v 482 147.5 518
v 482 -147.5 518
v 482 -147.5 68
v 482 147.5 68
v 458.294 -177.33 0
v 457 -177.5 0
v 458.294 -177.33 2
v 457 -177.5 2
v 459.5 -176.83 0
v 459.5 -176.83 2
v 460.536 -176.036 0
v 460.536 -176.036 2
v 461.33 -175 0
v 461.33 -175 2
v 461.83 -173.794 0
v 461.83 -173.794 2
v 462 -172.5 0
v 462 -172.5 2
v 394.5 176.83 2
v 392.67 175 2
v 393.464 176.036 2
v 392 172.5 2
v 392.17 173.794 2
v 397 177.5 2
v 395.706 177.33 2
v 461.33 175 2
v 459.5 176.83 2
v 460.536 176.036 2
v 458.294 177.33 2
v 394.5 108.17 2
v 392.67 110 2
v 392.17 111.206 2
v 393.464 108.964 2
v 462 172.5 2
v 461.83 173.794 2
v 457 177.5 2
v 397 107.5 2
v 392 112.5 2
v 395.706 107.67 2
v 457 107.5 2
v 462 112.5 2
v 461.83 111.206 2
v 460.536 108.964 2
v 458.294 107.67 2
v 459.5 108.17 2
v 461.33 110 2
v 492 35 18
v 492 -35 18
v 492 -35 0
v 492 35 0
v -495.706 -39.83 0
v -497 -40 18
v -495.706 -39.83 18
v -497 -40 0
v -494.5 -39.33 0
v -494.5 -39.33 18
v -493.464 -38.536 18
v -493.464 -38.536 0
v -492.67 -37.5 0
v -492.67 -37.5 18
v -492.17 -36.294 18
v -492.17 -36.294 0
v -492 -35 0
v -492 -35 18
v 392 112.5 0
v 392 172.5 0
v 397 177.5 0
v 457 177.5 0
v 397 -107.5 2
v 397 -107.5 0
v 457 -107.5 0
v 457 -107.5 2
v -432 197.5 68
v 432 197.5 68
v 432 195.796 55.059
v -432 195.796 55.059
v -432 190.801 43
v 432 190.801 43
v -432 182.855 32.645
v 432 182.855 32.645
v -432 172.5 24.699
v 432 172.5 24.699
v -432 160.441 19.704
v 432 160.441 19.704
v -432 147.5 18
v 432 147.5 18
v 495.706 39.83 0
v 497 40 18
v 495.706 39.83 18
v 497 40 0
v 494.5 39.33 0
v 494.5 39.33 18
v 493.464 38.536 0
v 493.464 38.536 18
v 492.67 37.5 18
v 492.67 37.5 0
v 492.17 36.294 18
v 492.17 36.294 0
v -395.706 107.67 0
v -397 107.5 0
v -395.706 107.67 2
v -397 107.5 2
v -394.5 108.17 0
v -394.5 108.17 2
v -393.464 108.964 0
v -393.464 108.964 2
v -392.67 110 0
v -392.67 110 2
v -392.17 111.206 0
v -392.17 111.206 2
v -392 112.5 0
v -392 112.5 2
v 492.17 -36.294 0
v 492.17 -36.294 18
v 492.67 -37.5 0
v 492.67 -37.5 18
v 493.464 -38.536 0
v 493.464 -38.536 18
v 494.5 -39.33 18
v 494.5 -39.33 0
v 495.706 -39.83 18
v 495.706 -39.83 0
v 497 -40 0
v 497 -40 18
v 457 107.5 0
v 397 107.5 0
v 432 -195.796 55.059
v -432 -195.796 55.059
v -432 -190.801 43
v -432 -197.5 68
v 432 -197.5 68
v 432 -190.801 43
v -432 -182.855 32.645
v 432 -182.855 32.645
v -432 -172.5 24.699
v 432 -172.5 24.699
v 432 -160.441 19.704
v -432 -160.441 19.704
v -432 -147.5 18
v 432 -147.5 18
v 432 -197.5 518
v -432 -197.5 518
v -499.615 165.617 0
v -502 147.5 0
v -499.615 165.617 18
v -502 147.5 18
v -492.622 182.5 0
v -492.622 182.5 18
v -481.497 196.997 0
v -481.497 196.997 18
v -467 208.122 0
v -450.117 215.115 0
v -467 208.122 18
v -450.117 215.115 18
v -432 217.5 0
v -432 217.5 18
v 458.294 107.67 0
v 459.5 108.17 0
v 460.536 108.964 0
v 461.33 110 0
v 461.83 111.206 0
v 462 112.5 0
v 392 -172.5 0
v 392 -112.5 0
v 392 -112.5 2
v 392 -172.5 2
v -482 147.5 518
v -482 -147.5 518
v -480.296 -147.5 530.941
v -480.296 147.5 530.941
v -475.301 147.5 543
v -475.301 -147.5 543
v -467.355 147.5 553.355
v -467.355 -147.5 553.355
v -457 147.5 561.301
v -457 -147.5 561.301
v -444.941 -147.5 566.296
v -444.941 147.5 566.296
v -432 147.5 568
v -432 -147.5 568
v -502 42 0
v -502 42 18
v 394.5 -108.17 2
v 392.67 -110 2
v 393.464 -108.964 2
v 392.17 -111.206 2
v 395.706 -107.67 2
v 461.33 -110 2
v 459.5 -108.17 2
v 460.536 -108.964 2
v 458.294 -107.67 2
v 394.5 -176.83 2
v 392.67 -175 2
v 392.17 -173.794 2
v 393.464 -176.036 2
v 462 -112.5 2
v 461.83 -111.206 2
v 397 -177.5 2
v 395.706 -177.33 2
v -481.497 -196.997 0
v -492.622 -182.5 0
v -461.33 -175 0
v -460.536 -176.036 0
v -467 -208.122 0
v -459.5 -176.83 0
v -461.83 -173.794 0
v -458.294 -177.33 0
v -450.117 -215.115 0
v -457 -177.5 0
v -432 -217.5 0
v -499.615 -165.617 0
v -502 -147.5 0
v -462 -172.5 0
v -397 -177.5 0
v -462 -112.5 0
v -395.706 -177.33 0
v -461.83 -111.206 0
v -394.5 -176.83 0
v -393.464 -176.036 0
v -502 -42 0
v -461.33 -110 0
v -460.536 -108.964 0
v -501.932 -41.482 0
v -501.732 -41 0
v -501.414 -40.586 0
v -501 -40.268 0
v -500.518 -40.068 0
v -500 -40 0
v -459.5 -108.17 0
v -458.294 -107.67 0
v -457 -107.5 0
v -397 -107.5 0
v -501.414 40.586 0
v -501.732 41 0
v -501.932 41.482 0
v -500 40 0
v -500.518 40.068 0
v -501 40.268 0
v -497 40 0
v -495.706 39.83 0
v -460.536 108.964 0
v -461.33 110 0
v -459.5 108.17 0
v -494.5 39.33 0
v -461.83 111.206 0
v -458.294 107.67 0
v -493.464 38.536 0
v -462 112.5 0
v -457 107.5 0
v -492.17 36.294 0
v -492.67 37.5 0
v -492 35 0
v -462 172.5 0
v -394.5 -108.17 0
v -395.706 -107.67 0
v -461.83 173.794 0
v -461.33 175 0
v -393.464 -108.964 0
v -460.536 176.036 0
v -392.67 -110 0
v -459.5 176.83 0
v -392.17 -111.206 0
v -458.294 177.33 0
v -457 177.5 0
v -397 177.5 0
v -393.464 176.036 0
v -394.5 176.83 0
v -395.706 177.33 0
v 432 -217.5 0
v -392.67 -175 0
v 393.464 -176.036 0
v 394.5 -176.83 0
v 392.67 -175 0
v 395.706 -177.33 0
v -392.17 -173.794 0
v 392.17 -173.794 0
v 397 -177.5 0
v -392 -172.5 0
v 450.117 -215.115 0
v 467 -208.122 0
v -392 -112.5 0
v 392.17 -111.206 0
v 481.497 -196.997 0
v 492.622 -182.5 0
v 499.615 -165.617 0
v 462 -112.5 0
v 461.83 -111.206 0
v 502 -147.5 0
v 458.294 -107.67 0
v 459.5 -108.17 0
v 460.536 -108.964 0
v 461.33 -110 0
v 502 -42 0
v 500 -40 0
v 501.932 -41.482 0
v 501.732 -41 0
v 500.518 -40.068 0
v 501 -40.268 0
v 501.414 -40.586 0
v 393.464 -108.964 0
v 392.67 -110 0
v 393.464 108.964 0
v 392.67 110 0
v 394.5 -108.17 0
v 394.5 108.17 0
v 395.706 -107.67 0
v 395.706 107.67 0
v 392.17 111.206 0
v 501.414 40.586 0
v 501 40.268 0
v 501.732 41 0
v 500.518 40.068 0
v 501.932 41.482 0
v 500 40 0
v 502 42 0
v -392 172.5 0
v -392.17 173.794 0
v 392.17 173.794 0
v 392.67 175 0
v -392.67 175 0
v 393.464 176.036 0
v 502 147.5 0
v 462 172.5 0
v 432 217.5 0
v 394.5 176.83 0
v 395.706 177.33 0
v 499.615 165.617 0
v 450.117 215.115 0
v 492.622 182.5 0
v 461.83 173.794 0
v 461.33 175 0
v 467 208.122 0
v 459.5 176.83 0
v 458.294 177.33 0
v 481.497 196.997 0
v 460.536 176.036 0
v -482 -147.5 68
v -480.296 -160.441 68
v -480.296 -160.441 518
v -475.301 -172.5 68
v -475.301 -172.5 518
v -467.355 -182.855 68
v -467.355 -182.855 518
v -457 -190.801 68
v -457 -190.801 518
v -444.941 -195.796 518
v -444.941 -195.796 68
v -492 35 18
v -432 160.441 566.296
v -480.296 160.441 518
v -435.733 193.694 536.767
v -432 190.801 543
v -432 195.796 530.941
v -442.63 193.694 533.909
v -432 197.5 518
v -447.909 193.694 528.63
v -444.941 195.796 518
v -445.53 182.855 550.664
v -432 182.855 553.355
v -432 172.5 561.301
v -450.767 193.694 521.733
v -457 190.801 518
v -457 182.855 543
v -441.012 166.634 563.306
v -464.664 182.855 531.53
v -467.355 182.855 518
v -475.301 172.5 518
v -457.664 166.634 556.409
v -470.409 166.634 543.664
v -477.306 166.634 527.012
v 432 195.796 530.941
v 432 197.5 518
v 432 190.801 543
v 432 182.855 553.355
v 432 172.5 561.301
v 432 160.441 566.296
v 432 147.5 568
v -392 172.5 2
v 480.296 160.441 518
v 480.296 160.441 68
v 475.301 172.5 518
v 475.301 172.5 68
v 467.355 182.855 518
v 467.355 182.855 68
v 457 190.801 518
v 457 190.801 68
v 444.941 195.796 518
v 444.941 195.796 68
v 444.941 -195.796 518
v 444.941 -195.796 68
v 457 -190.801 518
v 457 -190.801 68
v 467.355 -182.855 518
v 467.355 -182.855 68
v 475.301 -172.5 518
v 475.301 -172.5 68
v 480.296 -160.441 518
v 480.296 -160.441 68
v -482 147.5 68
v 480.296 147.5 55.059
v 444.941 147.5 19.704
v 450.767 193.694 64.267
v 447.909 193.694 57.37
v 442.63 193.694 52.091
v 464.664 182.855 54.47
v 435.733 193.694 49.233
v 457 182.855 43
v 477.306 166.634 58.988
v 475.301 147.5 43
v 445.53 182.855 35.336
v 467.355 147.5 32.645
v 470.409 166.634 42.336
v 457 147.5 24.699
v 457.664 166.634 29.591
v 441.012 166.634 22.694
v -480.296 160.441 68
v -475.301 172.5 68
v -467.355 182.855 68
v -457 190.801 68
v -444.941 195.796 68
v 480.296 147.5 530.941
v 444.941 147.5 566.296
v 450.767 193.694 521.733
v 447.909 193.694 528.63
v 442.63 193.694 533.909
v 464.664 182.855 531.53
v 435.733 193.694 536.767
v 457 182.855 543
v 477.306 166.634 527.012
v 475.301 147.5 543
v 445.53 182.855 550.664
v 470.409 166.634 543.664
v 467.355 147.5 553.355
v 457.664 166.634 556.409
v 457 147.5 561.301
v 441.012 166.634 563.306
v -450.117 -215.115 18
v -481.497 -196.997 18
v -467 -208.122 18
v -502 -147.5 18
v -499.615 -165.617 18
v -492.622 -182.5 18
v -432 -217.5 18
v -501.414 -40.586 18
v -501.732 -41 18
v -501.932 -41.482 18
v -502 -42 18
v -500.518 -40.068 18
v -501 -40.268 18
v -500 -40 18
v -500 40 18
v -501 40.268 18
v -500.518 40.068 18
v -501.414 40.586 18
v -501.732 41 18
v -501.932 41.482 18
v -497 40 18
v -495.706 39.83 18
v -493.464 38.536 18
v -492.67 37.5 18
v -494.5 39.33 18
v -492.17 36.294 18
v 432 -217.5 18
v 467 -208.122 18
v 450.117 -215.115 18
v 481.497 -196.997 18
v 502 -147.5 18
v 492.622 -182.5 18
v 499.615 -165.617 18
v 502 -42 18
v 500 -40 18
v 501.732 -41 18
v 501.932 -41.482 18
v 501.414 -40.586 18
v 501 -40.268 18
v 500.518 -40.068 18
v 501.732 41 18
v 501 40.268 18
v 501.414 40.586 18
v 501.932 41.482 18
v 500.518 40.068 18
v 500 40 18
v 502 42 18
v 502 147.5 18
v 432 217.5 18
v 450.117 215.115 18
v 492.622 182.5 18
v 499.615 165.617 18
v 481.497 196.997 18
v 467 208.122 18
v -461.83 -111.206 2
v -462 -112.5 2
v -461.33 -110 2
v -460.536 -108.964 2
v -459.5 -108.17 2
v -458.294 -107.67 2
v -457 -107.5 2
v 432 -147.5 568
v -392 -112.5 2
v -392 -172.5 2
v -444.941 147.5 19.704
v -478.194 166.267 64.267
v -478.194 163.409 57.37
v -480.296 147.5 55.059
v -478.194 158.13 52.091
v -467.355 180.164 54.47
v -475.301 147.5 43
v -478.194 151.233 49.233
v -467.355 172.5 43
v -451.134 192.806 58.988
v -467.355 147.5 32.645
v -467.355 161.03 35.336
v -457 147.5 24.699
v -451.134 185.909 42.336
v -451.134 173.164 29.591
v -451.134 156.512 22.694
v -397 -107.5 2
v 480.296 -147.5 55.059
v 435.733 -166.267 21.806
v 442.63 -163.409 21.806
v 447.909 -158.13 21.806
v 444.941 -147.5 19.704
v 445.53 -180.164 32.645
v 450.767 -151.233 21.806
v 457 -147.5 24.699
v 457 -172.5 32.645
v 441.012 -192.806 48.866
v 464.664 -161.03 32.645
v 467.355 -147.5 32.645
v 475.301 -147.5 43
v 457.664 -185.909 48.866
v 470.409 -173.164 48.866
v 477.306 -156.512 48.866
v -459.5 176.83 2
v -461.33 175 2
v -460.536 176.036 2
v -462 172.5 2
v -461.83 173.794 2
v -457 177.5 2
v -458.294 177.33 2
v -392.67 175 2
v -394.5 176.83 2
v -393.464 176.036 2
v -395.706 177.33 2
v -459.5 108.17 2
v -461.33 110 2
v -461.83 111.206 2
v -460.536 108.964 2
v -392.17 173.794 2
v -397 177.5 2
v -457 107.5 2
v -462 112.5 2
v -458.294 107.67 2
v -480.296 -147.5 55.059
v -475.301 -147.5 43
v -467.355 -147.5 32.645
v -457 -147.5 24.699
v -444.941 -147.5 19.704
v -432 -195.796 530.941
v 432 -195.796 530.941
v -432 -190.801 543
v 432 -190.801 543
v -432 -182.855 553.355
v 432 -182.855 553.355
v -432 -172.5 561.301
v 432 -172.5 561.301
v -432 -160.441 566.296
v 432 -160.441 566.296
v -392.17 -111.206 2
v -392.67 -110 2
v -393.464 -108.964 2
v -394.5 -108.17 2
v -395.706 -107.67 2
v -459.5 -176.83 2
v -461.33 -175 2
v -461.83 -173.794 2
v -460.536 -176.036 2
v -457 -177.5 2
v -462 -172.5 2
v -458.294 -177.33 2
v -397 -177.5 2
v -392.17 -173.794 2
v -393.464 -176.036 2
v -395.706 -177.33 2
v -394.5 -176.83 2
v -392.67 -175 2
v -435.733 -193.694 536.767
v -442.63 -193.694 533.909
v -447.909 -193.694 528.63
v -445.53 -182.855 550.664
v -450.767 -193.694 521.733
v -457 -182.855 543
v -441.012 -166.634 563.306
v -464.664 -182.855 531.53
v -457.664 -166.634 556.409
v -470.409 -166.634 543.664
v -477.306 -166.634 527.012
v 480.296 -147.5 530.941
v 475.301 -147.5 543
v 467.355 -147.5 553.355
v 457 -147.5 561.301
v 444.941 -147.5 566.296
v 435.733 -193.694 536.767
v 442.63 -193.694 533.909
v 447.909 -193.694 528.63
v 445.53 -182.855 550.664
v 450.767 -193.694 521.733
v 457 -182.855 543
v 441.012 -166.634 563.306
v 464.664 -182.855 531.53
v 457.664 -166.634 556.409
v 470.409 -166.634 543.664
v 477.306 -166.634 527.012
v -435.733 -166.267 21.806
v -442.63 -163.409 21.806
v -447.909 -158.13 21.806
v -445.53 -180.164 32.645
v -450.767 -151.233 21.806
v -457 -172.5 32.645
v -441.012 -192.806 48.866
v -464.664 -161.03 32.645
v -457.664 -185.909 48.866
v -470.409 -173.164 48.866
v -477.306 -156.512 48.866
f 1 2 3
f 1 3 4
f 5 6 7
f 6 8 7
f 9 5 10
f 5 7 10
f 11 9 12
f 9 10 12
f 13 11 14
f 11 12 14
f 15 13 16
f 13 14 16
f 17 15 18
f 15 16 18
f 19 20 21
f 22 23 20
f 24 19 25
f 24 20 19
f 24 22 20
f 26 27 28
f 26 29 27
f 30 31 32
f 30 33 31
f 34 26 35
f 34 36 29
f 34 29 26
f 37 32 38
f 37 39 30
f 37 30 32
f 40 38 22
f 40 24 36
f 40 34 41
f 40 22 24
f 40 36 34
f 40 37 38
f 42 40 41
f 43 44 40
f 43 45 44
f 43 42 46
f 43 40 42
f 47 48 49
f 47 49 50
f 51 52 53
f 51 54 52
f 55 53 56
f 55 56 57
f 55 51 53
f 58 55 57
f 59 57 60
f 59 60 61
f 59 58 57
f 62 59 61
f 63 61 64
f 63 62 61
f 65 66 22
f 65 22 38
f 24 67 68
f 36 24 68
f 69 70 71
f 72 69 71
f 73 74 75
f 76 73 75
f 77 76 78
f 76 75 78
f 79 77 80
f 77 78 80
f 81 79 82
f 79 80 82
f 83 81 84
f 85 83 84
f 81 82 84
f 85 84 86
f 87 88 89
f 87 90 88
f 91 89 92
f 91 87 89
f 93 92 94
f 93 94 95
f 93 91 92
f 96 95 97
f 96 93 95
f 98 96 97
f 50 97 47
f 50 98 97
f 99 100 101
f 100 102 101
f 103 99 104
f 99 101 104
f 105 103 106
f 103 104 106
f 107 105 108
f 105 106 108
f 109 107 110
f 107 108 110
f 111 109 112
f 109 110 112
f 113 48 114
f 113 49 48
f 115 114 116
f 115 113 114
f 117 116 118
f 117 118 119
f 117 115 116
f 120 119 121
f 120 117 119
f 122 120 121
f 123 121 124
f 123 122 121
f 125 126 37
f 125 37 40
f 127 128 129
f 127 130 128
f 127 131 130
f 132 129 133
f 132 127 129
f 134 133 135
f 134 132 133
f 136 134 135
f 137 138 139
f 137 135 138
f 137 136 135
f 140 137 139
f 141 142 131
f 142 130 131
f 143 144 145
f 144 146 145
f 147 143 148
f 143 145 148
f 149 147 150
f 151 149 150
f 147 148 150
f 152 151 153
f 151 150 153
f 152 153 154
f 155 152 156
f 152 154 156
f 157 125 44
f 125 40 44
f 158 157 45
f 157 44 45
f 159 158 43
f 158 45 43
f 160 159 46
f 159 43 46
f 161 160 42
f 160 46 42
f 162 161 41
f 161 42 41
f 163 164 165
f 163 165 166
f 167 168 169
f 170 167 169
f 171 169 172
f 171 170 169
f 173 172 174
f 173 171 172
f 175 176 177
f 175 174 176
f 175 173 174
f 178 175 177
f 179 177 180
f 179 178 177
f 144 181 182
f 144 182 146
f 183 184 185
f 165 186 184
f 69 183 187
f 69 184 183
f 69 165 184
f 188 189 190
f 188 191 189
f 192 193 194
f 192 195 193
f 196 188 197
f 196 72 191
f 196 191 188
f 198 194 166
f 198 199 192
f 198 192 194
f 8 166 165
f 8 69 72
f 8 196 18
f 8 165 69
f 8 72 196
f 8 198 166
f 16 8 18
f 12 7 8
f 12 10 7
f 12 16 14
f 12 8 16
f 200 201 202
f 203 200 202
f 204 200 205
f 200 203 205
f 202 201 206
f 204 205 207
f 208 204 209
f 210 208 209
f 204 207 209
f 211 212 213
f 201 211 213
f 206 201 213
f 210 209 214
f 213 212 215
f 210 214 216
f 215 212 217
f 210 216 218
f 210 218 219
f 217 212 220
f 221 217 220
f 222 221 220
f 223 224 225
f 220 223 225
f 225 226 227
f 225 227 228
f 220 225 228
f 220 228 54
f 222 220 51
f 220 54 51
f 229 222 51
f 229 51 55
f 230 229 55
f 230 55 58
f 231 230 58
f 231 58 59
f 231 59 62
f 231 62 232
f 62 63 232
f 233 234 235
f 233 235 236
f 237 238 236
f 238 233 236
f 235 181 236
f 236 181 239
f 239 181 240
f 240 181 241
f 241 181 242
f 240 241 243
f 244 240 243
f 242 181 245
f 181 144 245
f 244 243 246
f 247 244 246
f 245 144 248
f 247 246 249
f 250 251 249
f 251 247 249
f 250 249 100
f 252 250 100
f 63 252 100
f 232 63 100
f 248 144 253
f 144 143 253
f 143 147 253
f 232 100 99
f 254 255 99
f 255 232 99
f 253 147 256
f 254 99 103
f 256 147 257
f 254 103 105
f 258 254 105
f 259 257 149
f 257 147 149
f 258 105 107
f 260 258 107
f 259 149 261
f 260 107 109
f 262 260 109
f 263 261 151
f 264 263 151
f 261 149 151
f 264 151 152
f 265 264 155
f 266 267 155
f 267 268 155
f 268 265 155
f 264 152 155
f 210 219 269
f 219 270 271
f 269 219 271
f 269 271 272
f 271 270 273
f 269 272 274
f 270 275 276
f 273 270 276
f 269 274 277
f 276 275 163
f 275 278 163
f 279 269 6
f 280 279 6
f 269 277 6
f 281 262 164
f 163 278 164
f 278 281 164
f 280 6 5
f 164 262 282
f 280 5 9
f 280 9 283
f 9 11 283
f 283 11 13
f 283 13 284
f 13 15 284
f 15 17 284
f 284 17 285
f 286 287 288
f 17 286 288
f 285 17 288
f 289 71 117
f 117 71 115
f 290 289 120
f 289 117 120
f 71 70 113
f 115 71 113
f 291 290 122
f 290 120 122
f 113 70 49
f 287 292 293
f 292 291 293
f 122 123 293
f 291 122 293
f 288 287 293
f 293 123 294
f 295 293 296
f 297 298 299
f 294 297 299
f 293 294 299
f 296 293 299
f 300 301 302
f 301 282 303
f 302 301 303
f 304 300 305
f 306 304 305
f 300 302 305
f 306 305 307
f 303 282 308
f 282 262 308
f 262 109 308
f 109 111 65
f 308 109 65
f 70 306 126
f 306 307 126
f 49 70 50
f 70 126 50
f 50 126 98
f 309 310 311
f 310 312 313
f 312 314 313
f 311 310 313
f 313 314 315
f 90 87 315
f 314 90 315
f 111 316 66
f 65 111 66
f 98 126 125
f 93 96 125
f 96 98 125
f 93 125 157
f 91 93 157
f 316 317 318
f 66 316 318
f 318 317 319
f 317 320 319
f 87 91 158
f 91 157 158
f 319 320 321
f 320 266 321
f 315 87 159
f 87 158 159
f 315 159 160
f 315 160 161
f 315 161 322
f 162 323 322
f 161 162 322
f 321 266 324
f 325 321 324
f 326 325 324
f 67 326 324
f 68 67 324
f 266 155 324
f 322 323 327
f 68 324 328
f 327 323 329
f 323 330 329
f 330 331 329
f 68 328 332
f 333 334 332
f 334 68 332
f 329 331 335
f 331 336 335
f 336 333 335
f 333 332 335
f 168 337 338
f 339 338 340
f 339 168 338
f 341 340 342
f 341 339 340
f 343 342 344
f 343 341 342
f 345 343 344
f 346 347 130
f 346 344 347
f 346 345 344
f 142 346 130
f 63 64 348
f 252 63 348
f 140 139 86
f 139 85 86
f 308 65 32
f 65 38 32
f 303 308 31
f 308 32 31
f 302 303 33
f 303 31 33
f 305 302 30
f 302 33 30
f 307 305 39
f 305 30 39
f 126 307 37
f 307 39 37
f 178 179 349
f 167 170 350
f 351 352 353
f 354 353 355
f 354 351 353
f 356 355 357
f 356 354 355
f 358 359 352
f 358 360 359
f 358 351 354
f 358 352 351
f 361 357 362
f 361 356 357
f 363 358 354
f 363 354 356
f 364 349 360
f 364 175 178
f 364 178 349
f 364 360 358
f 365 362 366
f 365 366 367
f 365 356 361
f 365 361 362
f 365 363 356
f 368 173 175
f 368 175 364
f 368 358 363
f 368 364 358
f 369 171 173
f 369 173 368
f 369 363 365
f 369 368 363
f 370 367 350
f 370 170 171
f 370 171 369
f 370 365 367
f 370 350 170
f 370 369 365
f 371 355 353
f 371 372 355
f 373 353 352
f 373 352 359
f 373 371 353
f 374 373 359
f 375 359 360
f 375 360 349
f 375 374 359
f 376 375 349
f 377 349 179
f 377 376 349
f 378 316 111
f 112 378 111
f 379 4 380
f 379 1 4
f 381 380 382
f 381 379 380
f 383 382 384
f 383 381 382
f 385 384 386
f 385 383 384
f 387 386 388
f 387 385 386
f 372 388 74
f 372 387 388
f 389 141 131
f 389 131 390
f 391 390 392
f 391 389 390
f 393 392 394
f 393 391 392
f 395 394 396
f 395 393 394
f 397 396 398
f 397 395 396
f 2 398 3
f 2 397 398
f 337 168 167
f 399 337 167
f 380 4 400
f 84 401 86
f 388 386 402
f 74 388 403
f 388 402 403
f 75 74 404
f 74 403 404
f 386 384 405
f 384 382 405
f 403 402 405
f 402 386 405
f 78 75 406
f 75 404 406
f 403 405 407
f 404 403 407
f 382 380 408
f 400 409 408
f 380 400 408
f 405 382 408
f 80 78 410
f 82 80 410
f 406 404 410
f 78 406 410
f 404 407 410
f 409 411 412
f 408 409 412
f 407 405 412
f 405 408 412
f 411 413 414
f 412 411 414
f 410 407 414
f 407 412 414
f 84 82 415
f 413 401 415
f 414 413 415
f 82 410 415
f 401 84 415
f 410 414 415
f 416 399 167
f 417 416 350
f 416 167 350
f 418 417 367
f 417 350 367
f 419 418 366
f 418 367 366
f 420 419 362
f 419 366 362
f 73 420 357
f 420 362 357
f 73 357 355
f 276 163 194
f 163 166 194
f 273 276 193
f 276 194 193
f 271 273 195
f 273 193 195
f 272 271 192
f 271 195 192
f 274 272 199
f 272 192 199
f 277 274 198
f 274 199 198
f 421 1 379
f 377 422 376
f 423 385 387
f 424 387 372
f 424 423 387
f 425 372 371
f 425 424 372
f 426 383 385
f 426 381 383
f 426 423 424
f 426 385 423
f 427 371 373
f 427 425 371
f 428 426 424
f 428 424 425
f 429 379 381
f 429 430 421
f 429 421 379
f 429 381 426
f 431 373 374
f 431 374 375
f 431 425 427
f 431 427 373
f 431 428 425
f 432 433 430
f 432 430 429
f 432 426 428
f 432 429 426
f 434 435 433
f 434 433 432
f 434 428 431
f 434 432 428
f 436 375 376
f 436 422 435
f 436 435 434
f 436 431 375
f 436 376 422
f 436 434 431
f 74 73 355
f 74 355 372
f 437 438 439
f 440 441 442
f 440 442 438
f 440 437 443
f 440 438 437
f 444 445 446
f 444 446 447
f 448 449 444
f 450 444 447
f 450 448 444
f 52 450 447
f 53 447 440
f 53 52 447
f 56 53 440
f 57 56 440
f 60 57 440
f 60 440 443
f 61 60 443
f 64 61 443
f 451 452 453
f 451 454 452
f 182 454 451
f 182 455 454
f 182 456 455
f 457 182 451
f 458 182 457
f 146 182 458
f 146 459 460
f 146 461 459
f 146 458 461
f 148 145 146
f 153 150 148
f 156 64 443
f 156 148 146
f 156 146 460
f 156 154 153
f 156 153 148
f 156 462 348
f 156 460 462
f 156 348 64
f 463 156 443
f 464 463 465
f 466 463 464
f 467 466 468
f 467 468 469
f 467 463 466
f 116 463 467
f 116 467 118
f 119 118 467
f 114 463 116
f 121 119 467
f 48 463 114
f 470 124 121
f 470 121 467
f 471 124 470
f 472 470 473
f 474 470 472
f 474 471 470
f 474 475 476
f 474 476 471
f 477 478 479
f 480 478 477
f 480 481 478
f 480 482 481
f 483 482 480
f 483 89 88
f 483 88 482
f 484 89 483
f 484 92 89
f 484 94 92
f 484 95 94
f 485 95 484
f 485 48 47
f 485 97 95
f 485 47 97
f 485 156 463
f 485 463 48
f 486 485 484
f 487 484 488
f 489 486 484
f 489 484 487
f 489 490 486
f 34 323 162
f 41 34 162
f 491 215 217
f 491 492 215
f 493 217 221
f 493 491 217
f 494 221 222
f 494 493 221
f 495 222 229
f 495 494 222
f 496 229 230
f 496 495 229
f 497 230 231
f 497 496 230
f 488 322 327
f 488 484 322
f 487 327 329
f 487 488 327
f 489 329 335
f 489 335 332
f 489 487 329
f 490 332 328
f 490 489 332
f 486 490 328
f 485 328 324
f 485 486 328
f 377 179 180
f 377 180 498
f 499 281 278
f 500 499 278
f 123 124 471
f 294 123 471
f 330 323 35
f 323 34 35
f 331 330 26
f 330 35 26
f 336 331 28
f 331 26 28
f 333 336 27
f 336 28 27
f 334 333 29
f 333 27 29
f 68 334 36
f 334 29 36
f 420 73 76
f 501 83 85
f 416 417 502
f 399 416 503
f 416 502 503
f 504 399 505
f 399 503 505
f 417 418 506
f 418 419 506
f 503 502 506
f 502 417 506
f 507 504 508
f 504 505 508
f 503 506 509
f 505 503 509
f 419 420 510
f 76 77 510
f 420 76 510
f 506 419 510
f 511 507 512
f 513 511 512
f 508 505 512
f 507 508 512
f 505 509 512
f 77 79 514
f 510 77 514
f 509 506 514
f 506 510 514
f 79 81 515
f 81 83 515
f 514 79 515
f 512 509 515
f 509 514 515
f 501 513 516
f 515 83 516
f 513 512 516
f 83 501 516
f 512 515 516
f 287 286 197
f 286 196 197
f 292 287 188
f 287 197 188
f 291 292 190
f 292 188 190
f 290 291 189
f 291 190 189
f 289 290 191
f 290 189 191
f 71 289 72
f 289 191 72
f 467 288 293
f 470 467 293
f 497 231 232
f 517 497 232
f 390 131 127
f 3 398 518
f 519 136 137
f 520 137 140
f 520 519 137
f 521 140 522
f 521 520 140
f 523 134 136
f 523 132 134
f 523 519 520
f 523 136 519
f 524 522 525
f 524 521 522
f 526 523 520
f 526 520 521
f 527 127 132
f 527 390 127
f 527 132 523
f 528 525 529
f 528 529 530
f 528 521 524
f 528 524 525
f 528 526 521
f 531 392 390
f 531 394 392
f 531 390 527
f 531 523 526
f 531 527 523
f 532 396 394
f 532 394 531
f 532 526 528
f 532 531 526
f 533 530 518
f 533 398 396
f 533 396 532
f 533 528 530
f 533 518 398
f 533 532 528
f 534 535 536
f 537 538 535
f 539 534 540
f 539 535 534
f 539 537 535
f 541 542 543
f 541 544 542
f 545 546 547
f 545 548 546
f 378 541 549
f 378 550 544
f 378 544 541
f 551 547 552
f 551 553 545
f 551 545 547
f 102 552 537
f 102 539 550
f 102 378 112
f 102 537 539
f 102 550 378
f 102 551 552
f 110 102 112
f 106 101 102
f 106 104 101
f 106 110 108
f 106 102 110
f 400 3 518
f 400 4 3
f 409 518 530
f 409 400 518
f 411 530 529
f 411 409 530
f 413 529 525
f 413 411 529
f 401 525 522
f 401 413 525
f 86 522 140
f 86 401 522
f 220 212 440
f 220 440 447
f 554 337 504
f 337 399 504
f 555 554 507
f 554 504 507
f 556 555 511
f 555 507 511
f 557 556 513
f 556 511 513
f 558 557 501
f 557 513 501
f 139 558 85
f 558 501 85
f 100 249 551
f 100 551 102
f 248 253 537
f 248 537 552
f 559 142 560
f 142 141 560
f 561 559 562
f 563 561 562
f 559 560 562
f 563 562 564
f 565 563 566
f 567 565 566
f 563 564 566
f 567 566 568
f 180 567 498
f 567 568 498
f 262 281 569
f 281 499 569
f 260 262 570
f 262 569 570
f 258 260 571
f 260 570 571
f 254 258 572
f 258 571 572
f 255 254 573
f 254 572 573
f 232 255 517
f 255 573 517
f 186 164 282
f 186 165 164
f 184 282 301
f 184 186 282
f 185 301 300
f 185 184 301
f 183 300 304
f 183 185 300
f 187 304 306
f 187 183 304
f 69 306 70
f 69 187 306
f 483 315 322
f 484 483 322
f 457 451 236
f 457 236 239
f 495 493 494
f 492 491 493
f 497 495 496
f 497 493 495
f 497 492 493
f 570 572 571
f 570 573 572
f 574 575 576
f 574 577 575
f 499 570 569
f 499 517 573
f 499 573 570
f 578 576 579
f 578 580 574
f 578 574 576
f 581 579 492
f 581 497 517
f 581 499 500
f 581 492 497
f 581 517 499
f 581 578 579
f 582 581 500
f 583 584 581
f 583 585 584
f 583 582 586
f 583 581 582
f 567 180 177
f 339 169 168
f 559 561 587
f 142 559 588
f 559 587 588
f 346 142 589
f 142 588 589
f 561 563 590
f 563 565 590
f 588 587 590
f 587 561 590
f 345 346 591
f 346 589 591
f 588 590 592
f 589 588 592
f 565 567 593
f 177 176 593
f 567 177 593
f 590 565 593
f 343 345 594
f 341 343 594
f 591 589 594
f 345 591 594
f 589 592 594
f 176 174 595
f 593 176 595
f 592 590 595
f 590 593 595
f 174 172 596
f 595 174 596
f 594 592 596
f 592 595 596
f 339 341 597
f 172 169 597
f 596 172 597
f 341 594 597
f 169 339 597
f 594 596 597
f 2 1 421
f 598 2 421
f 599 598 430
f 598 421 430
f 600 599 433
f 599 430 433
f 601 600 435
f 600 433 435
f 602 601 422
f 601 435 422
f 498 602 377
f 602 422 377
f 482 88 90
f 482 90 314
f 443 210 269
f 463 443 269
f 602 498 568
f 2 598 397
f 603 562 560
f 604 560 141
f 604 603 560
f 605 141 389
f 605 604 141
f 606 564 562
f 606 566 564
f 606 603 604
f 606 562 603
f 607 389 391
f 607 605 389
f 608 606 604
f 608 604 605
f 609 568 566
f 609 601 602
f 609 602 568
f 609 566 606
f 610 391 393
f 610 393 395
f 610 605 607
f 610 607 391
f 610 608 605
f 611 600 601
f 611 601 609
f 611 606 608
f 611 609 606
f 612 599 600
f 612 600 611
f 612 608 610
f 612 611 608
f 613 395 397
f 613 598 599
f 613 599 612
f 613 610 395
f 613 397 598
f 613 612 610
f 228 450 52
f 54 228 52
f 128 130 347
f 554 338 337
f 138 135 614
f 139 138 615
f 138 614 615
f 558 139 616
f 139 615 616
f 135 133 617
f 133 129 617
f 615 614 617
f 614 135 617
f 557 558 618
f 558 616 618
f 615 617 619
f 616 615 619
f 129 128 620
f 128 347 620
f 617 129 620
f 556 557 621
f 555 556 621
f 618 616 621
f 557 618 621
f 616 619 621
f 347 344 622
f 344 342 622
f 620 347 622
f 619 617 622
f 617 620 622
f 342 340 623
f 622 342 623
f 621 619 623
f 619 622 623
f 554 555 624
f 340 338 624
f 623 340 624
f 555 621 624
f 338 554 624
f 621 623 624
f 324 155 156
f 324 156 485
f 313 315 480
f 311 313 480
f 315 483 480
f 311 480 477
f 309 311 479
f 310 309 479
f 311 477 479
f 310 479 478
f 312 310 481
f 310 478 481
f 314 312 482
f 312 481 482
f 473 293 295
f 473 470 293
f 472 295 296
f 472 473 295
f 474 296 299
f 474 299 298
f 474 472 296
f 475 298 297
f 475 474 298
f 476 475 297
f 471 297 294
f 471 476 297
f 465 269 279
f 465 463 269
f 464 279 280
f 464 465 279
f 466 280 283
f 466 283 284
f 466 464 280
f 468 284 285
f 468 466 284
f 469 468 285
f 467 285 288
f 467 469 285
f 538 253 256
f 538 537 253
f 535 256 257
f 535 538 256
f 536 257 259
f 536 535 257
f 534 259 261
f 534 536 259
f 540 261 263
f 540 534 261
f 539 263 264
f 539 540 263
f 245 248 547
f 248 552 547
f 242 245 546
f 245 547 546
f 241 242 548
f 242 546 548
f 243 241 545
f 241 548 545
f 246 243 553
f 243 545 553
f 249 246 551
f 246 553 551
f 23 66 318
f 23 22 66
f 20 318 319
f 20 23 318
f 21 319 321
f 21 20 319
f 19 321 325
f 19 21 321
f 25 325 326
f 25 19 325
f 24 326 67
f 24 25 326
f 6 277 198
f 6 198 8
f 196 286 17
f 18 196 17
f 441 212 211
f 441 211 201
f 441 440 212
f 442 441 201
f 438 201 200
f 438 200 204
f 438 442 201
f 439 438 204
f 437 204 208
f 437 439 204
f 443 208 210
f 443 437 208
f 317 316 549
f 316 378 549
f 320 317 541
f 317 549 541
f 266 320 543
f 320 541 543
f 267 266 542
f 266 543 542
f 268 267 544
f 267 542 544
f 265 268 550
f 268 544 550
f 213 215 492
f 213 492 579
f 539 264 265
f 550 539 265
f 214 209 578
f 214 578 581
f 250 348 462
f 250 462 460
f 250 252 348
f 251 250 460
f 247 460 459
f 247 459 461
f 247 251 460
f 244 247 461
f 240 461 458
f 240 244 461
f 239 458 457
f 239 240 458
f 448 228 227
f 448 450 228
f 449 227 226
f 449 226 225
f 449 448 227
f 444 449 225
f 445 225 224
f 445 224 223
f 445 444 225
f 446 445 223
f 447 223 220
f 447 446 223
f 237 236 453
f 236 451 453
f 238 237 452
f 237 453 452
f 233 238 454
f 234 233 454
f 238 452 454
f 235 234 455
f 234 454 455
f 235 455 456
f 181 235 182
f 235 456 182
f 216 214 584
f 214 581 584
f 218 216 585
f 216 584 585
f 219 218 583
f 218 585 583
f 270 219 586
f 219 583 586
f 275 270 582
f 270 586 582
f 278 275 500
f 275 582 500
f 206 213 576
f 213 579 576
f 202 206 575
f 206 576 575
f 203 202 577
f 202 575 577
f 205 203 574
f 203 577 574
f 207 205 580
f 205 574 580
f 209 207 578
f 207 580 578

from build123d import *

# Parameters (mm, degrees)
F0_W      = 1004
F0_H      = 435
F1_DEPTH  = 18
F2_R      = 70
F3_W      = 70
F3_H      = 70
F4_DEPTH  = 2
F5_R      = 5
F6_W      = 20
F6_H      = 80
F7_DEPTH  = 18
F8_R      = 5
F9_W      = 964
F9_H      = 395
F10_DEPTH = 550
F11_R     = 50
F12_R     = 2


with BuildPart() as f1:
    # F0 (on Top) → F1 (new body)
    with BuildSketch(Plane.XY):
        Rectangle(F0_W, F0_H)
    extrude(amount=F1_DEPTH)

    # F2
    f2_edges = [f1.edges().sort_by_distance(p)[0] for p in [
        (-502, -217.5, 9),
        (-502, 217.5, 9),
        (502, 217.5, 9),
        (502, -217.5, 9),
    ]]
    fillet(f2_edges, radius=F2_R)

    # F3 (on face) → F4 (cut)
    with BuildSketch(Plane(origin=(0, 0, 0), x_dir=(1, 0, 0), z_dir=(0, 0, -1))):
        with Locations((-427, 142.5)):
            Rectangle(F3_W, F3_H)
        with Locations((-427, -142.5)):
            Rectangle(F3_W, F3_H)
        with Locations((427, -142.5)):
            Rectangle(F3_W, F3_H)
        with Locations((427, 142.5)):
            Rectangle(F3_W, F3_H)
    extrude(amount=-F4_DEPTH, mode=Mode.SUBTRACT)

    # F5
    f5_edges = [f1.edges().sort_by_distance(p)[0] for p in [
        (-462, -177.5, 1),
        (-392, -177.5, 1),
        (-462, -107.5, 1),
        (-392, -107.5, 1),
        (-392, 177.5, 1),
        (-462, 177.5, 1),
        (-392, 107.5, 1),
        (-462, 107.5, 1),
        (392, 107.5, 1),
        (462, 107.5, 1),
        (392, 177.5, 1),
        (462, 177.5, 1),
        (462, -107.5, 1),
        (392, -107.5, 1),
        (462, -177.5, 1),
        (392, -177.5, 1),
    ]]
    fillet(f5_edges, radius=F5_R)

    # F6 (on face) → F7 (cut)
    with BuildSketch(Plane.XY.offset(18)):
        with Locations((-502, 0)):
            Rectangle(F6_W, F6_H)
        with Locations((502, 0)):
            Rectangle(F6_W, F6_H)
    extrude(amount=-F7_DEPTH, mode=Mode.SUBTRACT)

    # F8
    f8_edges = [f1.edges().sort_by_distance(p)[0] for p in [
        (-492, 40, 9),
        (-492, -40, 9),
        (492, -40, 9),
        (492, 40, 9),
    ]]
    fillet(f8_edges, radius=F8_R)

    # F12
    f12_edges = [f1.edges().sort_by_distance(p)[0] for p in [
        (-502, -40, 9),
        (-502, 40, 9),
        (502, 40, 9),
        (502, -40, 9),
    ]]
    fillet(f12_edges, radius=F12_R)


with BuildPart() as f10:
    # F9 (on face) → F10 (new body)
    with BuildSketch(Plane.XY.offset(18)):
        Rectangle(F9_W, F9_H)
    extrude(amount=F10_DEPTH)

    # F11
    f11_edges = [f10.edges().sort_by_distance(p)[0] for p in [
        (482, 0, 568),
        (-482, 0, 568),
        (0, -197.5, 568),
        (482, -197.5, 293),
        (-482, -197.5, 293),
        (0, -197.5, 18),
        (482, 0, 18),
        (482, 197.5, 293),
        (0, 197.5, 568),
        (0, 197.5, 18),
        (-482, 197.5, 293),
        (-482, 0, 18),
    ]]
    fillet(f11_edges, radius=F11_R)


solid = Compound([f1.part, f10.part])
